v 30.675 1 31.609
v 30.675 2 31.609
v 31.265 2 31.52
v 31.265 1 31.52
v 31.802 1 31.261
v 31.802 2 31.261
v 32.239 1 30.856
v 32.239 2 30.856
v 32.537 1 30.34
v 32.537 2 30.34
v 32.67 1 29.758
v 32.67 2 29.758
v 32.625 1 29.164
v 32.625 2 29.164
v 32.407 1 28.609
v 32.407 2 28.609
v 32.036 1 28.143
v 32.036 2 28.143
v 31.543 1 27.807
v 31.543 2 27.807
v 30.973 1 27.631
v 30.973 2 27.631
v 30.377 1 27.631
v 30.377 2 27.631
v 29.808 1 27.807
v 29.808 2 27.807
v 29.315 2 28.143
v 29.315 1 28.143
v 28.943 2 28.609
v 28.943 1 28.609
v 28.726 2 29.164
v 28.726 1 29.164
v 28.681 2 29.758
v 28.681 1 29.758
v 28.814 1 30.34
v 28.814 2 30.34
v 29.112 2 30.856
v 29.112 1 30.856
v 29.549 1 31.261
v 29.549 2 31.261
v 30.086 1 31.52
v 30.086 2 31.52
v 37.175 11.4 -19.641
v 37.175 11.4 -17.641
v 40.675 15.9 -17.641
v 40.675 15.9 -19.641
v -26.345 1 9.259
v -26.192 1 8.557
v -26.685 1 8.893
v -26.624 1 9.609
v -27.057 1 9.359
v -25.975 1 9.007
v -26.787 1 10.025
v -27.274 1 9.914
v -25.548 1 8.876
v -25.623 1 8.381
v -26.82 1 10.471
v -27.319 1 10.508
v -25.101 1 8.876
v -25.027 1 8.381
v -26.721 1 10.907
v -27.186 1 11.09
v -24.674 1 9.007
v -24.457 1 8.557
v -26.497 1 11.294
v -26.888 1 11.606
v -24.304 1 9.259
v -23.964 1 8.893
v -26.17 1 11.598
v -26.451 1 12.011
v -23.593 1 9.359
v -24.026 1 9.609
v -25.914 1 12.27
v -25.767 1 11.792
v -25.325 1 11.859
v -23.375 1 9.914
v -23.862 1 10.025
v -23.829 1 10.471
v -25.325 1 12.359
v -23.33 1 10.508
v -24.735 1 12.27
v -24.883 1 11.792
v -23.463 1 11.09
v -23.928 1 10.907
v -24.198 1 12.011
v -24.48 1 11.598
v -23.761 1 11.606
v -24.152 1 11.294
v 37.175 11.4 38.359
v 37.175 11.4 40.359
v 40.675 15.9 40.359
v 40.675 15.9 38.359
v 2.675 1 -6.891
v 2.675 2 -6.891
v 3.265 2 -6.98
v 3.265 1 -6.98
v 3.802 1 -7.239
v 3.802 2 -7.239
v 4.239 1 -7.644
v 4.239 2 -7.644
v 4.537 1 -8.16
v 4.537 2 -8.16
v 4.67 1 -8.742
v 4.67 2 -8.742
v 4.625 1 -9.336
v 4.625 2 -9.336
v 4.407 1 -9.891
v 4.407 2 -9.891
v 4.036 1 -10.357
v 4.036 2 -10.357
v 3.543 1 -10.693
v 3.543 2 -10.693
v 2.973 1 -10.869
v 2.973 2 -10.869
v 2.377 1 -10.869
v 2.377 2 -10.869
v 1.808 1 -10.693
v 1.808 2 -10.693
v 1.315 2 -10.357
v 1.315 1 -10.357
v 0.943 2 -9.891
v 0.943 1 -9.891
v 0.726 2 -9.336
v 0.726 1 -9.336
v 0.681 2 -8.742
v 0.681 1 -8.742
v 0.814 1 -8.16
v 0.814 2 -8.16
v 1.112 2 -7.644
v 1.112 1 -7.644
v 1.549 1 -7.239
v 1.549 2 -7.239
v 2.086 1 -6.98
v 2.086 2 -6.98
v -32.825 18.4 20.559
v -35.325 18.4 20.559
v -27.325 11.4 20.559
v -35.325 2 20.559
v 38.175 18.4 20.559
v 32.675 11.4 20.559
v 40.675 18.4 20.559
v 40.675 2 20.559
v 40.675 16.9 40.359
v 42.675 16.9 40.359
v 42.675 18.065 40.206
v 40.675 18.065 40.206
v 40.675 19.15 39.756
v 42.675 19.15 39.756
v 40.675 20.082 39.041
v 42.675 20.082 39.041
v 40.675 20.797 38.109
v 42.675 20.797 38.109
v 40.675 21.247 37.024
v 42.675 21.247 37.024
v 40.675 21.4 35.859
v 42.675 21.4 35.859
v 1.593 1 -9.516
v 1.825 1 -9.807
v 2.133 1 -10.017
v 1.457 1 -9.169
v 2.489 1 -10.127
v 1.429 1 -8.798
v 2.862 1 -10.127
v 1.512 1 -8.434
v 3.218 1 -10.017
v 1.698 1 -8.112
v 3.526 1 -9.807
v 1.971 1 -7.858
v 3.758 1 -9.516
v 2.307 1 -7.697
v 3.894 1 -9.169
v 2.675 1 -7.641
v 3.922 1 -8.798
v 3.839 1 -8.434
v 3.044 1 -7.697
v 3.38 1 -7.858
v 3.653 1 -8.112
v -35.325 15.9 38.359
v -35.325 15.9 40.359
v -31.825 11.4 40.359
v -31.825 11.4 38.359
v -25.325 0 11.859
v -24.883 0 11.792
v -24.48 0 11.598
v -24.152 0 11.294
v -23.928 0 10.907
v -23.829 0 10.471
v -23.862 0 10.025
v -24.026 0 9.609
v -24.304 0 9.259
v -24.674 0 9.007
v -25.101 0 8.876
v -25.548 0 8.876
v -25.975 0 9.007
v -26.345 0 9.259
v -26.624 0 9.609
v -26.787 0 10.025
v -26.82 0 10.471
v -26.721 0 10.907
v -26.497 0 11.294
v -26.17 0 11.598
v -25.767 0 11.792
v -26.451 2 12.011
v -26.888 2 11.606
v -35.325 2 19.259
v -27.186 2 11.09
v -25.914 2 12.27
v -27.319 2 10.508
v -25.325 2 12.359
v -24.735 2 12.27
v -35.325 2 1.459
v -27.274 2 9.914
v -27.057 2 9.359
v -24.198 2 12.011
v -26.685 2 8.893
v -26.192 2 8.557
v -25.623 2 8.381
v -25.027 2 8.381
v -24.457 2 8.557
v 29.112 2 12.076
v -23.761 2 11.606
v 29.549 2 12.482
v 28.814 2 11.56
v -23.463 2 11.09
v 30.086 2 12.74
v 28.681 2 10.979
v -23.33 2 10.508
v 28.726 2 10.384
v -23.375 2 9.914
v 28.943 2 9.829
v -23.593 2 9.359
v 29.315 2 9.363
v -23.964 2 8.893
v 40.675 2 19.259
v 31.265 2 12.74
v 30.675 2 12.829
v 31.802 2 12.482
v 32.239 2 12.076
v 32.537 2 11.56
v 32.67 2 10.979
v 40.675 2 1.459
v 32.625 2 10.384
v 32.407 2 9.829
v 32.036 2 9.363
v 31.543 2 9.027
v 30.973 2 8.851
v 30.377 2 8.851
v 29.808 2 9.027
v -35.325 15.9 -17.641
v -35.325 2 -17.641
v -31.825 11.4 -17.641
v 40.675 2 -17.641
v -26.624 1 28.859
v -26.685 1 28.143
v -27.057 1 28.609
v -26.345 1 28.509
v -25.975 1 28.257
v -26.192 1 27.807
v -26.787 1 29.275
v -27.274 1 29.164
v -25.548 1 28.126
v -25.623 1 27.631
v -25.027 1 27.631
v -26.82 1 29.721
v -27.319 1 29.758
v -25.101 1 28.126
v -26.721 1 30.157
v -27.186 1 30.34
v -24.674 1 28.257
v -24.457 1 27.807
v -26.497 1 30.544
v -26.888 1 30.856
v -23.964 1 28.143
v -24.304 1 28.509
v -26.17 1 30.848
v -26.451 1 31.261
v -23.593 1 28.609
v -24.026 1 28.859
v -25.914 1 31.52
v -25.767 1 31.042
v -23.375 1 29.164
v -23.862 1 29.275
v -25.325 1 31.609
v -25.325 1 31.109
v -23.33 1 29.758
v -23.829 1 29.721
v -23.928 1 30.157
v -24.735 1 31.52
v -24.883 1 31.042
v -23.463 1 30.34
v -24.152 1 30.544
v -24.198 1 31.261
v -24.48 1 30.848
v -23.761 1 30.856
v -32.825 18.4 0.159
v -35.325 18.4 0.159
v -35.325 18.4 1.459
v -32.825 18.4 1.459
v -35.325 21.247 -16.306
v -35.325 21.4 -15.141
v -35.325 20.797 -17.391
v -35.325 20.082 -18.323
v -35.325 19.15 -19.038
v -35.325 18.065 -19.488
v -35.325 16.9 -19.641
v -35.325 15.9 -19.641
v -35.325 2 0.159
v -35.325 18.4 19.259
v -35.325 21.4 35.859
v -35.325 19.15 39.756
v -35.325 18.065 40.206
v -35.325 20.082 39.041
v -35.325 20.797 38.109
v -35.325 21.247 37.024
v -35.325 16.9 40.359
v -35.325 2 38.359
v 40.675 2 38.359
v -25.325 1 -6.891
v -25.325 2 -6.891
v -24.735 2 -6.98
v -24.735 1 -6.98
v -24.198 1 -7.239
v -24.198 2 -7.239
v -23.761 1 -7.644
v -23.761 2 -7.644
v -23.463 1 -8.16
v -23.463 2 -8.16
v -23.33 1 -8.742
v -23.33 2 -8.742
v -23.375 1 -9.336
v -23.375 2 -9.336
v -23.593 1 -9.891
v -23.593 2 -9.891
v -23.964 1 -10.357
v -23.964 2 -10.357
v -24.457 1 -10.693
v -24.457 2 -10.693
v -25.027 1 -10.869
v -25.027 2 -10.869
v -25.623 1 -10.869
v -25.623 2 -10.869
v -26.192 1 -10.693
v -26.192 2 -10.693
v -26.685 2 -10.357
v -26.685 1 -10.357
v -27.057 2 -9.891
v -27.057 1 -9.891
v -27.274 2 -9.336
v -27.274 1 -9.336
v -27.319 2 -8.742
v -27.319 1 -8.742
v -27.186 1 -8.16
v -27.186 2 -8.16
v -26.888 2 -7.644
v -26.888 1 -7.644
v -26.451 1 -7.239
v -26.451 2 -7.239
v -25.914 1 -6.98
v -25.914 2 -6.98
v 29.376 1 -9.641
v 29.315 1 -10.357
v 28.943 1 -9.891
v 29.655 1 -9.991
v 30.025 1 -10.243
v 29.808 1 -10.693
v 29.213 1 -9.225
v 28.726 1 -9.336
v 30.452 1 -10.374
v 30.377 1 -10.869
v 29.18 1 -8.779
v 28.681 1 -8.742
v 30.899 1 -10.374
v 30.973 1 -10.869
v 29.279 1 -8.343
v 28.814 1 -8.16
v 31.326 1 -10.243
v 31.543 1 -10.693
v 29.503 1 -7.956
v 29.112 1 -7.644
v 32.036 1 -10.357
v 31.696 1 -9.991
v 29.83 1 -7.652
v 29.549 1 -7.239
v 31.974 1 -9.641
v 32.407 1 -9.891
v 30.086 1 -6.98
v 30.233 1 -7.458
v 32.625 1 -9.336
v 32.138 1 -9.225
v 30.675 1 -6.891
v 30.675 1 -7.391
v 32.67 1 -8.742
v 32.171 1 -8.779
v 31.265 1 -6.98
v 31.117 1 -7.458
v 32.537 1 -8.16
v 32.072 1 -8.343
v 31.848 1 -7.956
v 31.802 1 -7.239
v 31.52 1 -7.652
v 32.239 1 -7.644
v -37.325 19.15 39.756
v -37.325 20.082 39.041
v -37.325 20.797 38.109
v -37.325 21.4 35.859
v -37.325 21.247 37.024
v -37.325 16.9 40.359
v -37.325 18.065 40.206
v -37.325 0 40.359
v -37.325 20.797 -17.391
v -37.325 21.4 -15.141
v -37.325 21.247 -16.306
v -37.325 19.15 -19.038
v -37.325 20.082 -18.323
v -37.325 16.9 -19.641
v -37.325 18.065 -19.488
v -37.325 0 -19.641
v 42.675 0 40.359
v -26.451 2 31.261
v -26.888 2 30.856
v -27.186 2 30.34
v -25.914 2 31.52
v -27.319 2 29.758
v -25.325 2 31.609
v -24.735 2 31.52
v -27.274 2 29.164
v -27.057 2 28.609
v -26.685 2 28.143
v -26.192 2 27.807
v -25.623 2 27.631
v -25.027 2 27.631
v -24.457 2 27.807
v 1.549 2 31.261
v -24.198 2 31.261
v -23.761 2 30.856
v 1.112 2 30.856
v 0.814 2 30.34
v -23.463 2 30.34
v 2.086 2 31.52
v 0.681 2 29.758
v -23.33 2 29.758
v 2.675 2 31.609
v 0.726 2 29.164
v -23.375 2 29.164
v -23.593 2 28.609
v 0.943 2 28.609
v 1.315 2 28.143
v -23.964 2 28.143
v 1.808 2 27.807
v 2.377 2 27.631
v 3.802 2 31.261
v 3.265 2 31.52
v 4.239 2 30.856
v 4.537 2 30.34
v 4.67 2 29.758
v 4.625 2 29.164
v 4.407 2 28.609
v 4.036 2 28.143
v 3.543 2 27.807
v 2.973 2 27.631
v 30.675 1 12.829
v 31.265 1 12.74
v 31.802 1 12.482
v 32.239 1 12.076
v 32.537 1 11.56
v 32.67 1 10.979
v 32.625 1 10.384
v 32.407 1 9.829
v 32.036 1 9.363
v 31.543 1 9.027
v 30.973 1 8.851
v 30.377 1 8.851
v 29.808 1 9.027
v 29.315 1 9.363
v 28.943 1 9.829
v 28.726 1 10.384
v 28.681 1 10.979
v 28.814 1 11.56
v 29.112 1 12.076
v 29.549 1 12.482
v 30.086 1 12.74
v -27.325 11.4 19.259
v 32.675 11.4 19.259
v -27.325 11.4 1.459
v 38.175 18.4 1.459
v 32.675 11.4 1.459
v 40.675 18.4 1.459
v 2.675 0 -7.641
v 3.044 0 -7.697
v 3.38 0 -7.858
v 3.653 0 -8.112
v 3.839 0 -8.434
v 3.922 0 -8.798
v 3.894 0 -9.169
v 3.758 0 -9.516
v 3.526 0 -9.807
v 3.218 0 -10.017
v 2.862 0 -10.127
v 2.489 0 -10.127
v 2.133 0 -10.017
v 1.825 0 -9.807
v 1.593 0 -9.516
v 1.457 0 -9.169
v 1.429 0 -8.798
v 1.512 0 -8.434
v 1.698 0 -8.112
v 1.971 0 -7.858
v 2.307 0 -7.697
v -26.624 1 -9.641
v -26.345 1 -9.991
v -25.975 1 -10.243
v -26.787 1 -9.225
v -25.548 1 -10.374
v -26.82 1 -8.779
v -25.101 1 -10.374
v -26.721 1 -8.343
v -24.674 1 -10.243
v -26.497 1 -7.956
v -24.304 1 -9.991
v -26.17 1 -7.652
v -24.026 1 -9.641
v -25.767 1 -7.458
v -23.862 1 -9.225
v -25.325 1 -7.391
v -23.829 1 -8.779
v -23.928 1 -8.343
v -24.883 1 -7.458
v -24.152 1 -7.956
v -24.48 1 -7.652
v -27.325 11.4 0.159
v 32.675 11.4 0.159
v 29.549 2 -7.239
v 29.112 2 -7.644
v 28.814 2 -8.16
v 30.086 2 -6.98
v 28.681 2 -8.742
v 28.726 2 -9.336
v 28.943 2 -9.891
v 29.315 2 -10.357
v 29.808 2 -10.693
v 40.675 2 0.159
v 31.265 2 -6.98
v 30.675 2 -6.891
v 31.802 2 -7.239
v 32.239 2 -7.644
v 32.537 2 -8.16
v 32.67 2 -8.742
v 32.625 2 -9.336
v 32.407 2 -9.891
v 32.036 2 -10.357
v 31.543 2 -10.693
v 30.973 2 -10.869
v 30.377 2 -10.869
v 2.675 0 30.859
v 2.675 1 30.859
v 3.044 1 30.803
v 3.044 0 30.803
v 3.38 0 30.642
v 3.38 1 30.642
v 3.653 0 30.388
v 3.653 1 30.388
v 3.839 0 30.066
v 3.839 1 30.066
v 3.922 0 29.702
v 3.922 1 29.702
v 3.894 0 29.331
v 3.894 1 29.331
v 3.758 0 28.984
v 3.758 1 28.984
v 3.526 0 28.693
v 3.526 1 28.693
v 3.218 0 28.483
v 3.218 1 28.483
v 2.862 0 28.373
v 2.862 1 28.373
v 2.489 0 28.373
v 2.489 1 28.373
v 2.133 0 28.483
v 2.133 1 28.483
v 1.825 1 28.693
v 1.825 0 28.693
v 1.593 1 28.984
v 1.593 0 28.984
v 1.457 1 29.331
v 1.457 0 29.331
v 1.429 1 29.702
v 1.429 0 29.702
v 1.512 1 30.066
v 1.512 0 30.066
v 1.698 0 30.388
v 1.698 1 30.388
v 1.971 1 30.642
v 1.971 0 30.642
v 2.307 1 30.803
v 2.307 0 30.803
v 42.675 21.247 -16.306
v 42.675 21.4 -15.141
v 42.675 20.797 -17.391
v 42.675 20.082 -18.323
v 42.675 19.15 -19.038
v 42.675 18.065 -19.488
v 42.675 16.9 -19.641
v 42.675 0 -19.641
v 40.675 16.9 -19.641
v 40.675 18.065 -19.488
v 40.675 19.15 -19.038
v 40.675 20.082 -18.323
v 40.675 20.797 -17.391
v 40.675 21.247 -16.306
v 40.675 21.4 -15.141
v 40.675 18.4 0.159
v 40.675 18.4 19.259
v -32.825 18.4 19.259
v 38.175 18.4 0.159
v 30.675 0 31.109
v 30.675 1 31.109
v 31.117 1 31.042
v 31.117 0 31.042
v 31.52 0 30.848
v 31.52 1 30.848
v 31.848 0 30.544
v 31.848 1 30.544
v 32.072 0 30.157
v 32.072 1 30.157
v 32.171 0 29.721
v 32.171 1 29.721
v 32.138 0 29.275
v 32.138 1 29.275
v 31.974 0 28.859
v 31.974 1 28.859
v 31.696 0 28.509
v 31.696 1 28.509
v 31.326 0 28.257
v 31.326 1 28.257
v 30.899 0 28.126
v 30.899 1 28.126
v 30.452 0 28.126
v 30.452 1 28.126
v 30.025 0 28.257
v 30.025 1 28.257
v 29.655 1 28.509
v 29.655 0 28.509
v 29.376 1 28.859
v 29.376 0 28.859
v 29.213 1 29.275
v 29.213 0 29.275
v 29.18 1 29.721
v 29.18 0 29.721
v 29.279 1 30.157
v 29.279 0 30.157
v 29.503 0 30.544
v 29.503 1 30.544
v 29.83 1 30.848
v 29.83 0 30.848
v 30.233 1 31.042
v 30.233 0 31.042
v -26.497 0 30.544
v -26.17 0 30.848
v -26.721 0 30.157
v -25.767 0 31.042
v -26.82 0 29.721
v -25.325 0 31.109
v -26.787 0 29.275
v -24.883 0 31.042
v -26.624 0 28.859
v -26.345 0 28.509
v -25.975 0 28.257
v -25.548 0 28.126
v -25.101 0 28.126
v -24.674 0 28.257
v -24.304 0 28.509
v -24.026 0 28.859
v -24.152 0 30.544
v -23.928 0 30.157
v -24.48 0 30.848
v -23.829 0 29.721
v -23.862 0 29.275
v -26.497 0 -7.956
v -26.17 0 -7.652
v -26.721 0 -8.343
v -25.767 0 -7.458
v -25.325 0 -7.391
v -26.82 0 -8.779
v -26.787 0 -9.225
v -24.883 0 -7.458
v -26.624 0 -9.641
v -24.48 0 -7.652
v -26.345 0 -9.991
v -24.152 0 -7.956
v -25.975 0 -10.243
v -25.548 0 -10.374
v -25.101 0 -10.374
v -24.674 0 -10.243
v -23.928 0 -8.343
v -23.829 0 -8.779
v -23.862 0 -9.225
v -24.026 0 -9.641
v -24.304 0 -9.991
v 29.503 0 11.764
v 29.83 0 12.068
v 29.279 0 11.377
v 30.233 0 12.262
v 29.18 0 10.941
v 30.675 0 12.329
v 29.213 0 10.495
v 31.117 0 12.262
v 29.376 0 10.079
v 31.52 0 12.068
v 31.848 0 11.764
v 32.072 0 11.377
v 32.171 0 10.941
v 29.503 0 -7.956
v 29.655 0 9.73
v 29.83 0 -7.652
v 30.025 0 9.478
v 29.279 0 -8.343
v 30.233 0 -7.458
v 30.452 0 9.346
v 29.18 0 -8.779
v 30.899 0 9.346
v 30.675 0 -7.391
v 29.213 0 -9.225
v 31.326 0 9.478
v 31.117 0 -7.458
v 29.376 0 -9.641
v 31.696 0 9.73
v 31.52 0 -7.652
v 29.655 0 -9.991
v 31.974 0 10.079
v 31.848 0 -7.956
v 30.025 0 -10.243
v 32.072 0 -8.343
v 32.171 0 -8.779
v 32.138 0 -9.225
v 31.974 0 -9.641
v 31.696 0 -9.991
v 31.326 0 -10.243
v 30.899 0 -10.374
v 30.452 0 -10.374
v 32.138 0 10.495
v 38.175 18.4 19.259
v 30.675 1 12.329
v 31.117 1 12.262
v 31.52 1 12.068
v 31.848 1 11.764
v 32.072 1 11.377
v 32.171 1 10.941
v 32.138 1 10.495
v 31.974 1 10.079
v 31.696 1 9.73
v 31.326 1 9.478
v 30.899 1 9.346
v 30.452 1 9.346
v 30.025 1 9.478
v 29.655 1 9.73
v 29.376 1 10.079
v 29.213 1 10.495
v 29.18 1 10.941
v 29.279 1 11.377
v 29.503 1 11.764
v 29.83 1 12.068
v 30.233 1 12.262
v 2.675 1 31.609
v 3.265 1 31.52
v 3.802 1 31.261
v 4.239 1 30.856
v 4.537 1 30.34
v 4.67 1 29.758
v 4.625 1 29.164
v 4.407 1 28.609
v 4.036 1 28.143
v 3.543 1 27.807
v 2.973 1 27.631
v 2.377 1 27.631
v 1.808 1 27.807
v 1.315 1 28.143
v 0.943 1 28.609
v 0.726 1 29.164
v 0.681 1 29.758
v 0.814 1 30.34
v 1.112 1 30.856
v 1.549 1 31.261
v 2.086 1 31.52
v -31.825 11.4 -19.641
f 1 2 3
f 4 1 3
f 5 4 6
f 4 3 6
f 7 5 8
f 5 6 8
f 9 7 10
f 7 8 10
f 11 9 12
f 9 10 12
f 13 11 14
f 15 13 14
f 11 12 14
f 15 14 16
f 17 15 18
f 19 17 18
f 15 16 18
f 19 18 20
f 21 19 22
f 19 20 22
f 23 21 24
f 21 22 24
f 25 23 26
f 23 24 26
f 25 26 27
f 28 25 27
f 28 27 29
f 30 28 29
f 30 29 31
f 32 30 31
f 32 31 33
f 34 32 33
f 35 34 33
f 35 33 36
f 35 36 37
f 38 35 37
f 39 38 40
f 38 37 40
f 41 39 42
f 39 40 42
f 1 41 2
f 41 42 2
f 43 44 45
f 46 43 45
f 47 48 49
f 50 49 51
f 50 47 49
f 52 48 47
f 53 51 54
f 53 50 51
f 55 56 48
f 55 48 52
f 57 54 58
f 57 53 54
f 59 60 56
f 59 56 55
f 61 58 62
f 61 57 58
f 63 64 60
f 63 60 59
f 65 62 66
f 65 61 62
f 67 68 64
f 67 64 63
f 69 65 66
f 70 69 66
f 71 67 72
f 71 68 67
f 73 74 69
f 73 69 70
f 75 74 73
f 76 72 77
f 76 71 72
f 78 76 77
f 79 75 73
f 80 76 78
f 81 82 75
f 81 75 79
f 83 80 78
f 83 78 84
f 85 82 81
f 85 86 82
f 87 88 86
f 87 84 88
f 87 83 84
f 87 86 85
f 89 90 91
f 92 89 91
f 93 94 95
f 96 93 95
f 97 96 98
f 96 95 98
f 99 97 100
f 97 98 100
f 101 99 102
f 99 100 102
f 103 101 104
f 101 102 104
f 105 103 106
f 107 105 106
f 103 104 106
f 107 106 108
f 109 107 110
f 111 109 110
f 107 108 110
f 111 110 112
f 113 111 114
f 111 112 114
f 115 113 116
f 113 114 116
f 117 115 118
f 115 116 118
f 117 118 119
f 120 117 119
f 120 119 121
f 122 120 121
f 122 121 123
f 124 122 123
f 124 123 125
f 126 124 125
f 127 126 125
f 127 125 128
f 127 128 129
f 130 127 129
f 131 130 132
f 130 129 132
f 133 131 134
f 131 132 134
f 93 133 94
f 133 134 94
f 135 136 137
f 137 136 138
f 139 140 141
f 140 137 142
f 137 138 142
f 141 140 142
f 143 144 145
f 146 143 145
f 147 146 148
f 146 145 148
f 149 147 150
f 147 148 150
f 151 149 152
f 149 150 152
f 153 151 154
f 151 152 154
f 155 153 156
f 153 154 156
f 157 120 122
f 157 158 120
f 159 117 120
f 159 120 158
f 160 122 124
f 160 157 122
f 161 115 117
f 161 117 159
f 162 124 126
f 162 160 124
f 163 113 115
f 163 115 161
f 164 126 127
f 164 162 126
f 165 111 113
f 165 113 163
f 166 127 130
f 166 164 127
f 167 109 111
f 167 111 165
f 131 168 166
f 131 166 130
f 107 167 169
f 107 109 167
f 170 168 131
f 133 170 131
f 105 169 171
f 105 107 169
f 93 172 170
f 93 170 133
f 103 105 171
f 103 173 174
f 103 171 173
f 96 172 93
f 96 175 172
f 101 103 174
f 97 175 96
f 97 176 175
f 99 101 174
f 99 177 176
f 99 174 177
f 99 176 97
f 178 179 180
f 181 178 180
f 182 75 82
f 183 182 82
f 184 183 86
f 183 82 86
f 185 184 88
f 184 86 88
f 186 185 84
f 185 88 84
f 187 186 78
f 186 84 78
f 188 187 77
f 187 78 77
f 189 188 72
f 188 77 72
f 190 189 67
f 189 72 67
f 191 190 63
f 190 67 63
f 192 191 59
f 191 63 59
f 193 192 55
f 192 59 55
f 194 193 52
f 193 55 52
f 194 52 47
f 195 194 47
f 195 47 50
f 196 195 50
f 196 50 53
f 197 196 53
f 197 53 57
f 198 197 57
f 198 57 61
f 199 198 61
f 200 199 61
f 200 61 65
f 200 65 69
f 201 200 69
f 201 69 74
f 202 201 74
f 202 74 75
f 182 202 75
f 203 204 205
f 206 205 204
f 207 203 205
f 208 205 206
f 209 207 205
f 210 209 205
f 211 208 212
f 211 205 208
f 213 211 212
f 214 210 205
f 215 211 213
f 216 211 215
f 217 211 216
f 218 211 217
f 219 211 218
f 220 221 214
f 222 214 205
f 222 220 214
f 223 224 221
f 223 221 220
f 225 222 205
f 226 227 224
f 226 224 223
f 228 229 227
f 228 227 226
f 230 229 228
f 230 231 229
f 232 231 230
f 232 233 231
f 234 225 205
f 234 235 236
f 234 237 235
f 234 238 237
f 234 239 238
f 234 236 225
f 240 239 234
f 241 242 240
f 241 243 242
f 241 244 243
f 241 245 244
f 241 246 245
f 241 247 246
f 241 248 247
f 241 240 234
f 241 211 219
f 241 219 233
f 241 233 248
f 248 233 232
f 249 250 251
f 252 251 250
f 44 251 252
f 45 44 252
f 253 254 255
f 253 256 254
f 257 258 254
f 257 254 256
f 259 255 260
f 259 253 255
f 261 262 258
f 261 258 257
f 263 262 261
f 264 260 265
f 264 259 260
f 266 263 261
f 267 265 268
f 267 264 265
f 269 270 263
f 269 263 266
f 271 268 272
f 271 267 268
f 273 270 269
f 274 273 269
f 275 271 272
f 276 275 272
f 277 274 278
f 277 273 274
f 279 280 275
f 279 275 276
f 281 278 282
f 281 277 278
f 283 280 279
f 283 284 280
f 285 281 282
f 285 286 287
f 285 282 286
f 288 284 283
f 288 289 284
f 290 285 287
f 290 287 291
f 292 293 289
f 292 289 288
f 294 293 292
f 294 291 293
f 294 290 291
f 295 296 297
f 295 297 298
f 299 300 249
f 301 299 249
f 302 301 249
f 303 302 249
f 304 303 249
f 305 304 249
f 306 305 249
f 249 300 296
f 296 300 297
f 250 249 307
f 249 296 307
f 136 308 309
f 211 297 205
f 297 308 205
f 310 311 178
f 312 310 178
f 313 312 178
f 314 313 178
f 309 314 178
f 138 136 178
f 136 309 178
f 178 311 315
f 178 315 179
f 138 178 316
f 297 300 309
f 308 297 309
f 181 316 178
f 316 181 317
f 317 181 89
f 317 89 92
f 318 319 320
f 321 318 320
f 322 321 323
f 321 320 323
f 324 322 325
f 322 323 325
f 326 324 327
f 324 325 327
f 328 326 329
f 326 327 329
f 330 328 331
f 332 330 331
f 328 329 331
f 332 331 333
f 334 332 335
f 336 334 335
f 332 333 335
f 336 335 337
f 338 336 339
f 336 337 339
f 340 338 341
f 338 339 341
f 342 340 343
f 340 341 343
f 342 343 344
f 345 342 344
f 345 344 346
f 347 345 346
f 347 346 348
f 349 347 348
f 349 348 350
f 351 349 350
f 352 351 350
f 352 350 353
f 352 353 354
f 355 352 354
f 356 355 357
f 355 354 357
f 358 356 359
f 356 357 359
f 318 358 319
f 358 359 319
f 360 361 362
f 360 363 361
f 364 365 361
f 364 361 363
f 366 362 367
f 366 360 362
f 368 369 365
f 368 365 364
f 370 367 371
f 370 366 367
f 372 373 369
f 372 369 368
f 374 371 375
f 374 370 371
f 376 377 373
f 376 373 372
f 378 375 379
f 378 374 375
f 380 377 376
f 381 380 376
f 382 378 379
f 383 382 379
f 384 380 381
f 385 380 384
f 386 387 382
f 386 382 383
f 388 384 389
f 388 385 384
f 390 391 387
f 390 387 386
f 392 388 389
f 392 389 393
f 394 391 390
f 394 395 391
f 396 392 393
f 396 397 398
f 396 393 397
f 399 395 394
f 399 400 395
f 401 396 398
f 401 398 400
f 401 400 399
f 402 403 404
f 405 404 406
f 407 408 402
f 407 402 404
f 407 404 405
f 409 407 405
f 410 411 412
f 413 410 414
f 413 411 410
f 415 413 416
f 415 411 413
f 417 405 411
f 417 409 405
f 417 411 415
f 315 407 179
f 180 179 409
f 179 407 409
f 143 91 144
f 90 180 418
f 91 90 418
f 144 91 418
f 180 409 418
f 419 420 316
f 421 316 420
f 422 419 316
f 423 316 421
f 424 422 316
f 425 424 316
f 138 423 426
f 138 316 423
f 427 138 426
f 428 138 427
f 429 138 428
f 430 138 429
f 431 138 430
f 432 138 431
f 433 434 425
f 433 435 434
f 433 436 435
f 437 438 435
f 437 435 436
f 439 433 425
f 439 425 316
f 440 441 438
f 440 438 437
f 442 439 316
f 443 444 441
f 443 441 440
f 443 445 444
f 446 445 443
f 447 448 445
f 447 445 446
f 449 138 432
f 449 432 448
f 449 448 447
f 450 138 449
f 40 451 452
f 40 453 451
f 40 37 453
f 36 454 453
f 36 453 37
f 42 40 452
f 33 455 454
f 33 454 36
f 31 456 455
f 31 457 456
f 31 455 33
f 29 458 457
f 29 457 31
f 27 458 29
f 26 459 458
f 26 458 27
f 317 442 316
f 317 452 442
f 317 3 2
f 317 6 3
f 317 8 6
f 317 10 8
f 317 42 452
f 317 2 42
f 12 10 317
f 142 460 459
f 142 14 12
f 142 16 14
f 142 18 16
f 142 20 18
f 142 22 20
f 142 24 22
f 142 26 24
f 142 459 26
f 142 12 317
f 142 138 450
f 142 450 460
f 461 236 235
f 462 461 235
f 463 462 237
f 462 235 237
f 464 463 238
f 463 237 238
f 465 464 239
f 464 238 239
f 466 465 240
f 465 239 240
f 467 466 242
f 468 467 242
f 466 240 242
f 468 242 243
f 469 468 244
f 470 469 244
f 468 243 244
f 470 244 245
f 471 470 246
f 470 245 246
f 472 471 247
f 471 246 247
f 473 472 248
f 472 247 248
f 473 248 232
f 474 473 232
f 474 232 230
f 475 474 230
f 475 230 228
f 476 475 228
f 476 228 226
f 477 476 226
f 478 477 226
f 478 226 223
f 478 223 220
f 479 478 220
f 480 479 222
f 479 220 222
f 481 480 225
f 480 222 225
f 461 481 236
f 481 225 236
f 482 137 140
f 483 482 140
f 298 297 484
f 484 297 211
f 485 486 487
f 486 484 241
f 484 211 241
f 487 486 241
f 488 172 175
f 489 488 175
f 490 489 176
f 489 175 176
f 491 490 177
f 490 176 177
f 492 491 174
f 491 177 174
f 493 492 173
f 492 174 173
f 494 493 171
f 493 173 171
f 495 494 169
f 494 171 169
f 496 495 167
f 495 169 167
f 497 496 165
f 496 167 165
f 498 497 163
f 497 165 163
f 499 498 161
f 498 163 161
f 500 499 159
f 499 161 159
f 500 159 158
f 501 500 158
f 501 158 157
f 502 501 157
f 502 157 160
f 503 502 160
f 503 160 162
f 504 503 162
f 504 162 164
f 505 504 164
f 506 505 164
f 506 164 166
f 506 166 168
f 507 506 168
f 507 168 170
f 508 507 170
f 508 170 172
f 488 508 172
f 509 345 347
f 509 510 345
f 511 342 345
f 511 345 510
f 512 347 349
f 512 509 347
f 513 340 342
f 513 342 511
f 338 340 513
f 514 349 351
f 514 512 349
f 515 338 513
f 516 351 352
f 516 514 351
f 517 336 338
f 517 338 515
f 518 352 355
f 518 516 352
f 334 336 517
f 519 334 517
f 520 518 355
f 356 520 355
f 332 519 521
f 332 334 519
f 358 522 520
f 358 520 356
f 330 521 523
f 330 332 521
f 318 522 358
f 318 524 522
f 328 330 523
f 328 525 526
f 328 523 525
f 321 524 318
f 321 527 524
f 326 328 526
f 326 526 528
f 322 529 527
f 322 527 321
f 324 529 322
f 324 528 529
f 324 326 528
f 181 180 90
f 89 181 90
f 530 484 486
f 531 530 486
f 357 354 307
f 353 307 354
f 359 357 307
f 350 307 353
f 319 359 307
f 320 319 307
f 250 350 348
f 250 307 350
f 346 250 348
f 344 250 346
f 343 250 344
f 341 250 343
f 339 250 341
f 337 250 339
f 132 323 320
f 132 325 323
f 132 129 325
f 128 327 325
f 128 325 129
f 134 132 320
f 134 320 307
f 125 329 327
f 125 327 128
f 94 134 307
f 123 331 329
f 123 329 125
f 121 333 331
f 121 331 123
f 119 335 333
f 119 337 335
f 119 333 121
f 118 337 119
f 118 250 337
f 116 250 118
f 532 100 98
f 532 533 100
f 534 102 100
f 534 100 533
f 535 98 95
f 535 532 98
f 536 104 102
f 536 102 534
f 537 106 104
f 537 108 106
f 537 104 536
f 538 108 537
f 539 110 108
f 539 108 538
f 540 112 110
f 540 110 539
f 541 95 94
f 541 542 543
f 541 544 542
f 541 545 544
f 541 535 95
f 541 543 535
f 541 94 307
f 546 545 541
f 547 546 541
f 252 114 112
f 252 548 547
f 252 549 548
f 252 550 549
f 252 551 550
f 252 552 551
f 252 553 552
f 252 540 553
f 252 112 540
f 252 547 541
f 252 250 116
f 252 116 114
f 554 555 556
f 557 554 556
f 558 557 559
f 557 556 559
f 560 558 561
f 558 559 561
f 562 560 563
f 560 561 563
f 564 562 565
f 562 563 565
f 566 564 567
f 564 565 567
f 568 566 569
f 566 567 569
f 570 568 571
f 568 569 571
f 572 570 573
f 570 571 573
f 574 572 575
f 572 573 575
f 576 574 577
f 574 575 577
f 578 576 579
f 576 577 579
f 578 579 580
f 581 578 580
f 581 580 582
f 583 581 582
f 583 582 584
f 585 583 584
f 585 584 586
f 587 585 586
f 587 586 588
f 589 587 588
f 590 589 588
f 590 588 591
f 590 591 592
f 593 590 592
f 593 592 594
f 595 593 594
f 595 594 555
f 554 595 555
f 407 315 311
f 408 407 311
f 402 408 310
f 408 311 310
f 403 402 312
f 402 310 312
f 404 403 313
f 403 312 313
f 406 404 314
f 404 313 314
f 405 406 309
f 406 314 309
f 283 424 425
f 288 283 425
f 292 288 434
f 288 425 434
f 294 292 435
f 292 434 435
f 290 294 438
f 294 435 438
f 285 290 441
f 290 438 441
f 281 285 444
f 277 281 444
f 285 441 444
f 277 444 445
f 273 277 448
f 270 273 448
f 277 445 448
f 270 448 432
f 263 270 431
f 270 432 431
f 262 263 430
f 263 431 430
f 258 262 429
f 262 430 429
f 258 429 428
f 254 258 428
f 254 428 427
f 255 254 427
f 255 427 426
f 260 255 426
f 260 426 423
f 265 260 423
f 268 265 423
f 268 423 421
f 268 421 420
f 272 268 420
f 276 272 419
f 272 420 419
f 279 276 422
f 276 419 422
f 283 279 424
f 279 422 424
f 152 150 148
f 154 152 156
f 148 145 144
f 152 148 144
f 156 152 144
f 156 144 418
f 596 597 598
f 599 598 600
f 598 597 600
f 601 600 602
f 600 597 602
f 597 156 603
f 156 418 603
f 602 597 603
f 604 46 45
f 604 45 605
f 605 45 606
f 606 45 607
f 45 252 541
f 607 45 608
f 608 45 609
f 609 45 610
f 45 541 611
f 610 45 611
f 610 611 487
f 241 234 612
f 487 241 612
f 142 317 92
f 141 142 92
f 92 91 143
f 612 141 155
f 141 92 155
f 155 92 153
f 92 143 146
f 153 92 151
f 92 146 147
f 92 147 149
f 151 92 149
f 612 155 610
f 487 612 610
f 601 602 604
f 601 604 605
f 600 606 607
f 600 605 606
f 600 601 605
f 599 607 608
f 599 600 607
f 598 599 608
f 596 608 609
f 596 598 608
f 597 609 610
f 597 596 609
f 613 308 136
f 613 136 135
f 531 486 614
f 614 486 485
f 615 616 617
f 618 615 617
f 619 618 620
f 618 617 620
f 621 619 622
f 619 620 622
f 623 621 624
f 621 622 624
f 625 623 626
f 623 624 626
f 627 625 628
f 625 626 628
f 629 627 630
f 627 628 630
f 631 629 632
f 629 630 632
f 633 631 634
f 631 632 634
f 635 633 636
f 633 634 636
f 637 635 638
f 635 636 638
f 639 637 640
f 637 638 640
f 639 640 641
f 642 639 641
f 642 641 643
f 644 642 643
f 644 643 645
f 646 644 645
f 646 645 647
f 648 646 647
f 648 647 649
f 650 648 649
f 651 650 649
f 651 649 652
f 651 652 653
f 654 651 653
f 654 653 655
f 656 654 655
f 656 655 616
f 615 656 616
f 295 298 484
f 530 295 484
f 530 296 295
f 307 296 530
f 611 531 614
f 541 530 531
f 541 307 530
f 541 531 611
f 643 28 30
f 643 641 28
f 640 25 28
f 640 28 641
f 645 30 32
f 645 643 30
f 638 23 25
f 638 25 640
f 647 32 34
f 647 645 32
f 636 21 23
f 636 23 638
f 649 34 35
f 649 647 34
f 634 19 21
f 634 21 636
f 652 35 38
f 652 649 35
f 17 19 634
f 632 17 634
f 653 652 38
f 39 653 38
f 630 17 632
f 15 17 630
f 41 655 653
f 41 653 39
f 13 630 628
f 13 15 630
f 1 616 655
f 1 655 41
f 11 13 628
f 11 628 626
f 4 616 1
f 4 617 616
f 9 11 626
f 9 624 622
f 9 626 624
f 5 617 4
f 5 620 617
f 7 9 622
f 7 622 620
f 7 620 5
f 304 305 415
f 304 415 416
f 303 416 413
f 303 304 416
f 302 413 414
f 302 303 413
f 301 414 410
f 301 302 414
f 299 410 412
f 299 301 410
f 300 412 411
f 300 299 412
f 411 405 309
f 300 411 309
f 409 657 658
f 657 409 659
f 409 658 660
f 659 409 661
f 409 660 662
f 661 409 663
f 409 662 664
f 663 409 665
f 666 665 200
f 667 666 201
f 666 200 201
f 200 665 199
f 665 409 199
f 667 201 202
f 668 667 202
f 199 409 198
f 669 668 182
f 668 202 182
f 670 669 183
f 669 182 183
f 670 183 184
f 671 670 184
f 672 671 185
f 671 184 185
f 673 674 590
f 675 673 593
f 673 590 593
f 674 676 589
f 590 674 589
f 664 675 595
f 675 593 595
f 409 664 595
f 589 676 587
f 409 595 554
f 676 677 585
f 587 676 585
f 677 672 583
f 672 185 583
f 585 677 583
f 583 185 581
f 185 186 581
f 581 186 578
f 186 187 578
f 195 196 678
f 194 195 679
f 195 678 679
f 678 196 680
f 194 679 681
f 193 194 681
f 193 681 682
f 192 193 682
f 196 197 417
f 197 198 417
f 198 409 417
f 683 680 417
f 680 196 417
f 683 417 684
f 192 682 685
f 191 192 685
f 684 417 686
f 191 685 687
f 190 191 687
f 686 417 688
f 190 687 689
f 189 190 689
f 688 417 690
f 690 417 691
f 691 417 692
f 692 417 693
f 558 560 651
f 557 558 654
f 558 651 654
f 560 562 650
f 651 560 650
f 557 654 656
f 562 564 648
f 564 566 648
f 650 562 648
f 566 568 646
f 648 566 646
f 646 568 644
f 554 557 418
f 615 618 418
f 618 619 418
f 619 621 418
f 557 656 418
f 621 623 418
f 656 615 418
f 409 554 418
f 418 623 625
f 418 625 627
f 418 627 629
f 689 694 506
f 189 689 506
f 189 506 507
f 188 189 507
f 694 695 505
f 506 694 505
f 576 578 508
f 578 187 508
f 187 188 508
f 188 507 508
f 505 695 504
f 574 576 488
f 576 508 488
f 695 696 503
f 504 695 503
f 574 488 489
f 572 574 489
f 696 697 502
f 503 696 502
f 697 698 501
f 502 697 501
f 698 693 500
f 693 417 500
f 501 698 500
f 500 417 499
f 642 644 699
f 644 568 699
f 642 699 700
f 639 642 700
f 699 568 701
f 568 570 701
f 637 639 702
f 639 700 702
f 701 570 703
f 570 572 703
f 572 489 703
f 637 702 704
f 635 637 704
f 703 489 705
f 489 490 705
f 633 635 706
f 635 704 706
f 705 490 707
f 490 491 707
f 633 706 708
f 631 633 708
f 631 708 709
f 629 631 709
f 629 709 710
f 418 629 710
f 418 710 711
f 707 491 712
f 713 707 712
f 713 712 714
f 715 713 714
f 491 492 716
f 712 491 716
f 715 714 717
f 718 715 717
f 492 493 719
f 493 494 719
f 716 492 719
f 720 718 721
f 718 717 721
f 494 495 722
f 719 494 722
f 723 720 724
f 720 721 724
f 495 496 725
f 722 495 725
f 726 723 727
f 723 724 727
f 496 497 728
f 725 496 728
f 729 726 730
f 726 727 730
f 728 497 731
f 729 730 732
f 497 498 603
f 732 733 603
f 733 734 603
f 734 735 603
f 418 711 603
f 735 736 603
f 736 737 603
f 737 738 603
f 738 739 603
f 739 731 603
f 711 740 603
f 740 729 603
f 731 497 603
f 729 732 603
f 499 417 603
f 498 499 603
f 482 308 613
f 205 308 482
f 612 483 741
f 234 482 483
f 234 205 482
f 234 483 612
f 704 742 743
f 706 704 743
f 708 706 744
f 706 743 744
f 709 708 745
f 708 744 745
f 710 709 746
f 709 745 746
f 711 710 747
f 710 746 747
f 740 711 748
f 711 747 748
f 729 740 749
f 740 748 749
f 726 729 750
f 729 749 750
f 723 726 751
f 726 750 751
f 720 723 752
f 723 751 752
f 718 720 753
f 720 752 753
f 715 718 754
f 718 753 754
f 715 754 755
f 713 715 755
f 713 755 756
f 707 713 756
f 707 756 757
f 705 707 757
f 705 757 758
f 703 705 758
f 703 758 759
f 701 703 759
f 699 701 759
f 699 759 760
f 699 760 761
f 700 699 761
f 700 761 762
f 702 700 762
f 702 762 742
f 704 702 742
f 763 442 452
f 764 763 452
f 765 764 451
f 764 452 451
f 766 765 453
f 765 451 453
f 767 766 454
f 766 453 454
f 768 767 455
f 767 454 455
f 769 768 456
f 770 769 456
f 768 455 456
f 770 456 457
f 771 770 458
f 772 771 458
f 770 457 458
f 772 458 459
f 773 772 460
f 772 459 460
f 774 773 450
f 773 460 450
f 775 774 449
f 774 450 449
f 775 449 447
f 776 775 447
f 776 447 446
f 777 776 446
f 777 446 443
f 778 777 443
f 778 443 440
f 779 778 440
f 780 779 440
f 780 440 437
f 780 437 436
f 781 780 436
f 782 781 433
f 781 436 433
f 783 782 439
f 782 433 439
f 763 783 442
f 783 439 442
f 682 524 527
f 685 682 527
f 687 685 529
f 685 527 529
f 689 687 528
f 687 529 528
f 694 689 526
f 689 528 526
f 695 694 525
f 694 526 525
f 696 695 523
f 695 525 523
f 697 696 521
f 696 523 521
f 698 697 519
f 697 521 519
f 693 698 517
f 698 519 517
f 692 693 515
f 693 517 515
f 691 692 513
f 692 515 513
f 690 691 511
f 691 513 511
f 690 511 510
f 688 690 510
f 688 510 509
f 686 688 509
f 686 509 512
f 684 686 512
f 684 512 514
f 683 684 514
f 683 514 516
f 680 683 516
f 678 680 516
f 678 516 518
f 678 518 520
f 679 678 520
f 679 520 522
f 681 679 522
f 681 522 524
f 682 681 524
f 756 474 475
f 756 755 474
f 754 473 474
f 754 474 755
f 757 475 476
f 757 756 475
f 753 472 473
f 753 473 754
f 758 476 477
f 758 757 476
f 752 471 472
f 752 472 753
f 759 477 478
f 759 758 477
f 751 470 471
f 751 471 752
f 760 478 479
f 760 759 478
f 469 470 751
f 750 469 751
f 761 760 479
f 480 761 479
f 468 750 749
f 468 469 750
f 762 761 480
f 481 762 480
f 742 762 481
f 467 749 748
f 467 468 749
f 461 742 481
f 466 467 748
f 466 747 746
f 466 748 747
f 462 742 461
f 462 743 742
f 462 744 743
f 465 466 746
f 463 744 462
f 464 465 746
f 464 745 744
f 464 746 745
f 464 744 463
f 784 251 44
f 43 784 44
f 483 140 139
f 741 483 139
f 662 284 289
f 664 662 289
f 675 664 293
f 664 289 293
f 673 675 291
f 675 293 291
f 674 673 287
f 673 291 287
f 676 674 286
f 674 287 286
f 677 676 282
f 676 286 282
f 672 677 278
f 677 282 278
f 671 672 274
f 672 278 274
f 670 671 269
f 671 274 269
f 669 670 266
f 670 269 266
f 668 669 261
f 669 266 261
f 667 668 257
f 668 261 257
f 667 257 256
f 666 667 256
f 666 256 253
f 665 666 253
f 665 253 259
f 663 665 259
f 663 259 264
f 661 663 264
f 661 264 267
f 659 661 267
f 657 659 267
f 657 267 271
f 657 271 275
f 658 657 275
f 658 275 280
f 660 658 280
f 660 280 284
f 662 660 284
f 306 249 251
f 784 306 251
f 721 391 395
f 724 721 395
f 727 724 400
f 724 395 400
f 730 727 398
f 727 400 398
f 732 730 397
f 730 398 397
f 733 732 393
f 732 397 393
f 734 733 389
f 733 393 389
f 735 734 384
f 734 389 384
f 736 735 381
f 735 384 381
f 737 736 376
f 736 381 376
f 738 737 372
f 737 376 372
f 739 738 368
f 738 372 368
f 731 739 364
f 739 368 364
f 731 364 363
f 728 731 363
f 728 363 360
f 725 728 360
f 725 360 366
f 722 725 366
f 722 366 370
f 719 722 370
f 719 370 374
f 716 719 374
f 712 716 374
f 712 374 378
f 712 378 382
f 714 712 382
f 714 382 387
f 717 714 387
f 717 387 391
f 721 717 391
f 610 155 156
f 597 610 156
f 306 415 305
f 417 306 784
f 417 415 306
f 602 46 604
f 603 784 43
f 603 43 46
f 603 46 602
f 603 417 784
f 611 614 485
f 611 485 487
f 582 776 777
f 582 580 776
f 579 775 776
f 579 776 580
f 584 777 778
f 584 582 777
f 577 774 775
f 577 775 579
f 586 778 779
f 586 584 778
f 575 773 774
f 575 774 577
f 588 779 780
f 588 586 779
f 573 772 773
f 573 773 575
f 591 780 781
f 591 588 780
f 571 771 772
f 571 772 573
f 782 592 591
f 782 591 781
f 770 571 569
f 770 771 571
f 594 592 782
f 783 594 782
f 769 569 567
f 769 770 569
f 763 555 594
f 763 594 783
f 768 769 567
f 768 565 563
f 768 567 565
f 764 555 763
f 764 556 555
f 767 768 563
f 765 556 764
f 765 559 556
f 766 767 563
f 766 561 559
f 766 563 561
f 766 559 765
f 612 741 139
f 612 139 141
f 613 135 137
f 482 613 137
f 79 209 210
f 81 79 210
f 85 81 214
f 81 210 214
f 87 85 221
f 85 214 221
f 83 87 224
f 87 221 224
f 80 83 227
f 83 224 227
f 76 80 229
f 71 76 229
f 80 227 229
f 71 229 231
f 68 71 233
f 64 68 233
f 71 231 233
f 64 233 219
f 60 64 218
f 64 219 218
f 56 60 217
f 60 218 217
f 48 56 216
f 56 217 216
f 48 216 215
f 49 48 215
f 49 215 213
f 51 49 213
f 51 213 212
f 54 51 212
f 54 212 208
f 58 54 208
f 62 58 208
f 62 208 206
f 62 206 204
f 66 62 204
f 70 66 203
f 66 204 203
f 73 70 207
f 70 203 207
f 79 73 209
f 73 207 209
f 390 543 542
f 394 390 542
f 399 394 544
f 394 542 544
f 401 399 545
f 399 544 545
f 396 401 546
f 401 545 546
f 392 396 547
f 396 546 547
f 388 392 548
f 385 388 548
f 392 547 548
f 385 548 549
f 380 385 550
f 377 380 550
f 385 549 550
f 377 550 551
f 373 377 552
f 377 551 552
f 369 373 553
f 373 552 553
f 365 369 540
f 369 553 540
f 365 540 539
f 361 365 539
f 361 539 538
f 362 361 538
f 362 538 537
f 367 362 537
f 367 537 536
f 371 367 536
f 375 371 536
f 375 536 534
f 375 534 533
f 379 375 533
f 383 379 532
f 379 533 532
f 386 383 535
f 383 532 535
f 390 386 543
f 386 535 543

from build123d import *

# Parameters (mm, degrees)
SKETCH_1_W          = 80
SKETCH_1_H          = 60
EXTRUDE_1_DEPTH     = 21.4
FILLET_1_R          = 4.5
CUT_EXTRUDE_1_DEPTH = 77.675595548
SKETCH_3_W          = 76
SKETCH_3_H          = 56
CUT_EXTRUDE_2_DEPTH = 19.4
SKETCH_4_W          = 76
SKETCH_4_H          = 1.3
EXTRUDE_2_DEPTH     = 16.4
CUT_EXTRUDE_3_DEPTH = 26.4
CUT_EXTRUDE_4_REACH = 63.858
SKETCH_6_R          = 1.25
SKETCH_6_R_2        = 1.5
SKETCH_7_R          = 2
CUT_EXTRUDE_5_DEPTH = 1


with BuildPart() as part:
    # 草图1 → 凸台-拉伸1 (new body)
    with BuildSketch(Plane(origin=(0, 0, 0), x_dir=(1, 0, 0), z_dir=(0, 1, 0))):
        with Locations((2.675367047, -10.358890701)):
            Rectangle(SKETCH_1_W, SKETCH_1_H)
    extrude(amount=EXTRUDE_1_DEPTH)

    # 圆角1
    fillet_1_edges = [part.edges().sort_by_distance(p)[0] for p in [
        (2.675367047, 21.4, -19.641109299),
        (2.675367047, 21.4, 40.358890701),
    ]]
    fillet(fillet_1_edges, radius=FILLET_1_R)

    # 草图2 → 切除-拉伸1 (cut, through all)
    with BuildSketch(Plane.XY.offset(40.358890701)):
        Polygon((40.675367047, 21.4), (-35.324632953, 21.4), (-35.324632953, 15.9), (-31.824632953, 11.4), (37.175367047, 11.4), (40.675367047, 15.9), align=None)
    extrude(amount=-CUT_EXTRUDE_1_DEPTH, mode=Mode.SUBTRACT)

    # 草图3 → 切除-拉伸2 (cut)
    with BuildSketch(Plane(origin=(0, 21.4, 0), x_dir=(1, 0, 0), z_dir=(0, 1, 0))):
        with Locations((2.675367047, -10.358890701)):
            Rectangle(SKETCH_3_W, SKETCH_3_H)
    extrude(amount=-CUT_EXTRUDE_2_DEPTH, mode=Mode.SUBTRACT)

    # 草图4 → 凸台-拉伸2 (add)
    with BuildSketch(Plane(origin=(0, 2, 0), x_dir=(1, 0, 0), z_dir=(0, 1, 0))):
        with Locations((2.675367047, -0.808890701)):
            Rectangle(SKETCH_4_W, SKETCH_4_H)
        with Locations((2.675367047, -19.908890701)):
            Rectangle(SKETCH_4_W, SKETCH_4_H)
    extrude(amount=EXTRUDE_2_DEPTH)

    # 草图5 → 切除-拉伸3 (cut)
    with BuildSketch(Plane.XY.offset(20.558890701)):
        Polygon((-32.824984691, 18.4), (-27.324632953, 11.4), (32.675367047, 11.4), (38.175367047, 18.4), align=None)
    extrude(amount=-CUT_EXTRUDE_3_DEPTH, mode=Mode.SUBTRACT)

    # 草图6 → 切除-拉伸4 (cut, up to next)
    with BuildSketch(Plane(origin=(0, 2, 0), x_dir=(1, 0, 0), z_dir=(0, 1, 0)), mode=Mode.PRIVATE) as cut_extrude_4_sk1:
        with Locations(Location((2.675367047, 8.891109299, 0), (0, 0, 270))):
            Circle(SKETCH_6_R)
    cut_extrude_4_tool1 = extrude(cut_extrude_4_sk1.sketch, amount=-CUT_EXTRUDE_4_REACH, mode=Mode.PRIVATE) & part.part
    # 草图6 → 切除-拉伸4 (cut, up to next)
    with BuildSketch(Plane(origin=(0, 2, 0), x_dir=(1, 0, 0), z_dir=(0, 1, 0)), mode=Mode.PRIVATE) as cut_extrude_4_sk2:
        with Locations(Location((2.675367047, -29.608890701, 0), (0, 0, 270))):
            Circle(SKETCH_6_R)
    cut_extrude_4_tool2 = extrude(cut_extrude_4_sk2.sketch, amount=-CUT_EXTRUDE_4_REACH, mode=Mode.PRIVATE) & part.part
    # 草图6 → 切除-拉伸4 (cut, up to next)
    with BuildSketch(Plane(origin=(0, 2, 0), x_dir=(1, 0, 0), z_dir=(0, 1, 0)), mode=Mode.PRIVATE) as cut_extrude_4_sk3:
        with Locations(Location((-25.324632953, 8.891109299, 0), (0, 0, 270))):
            Circle(SKETCH_6_R_2)
    cut_extrude_4_tool3 = extrude(cut_extrude_4_sk3.sketch, amount=-CUT_EXTRUDE_4_REACH, mode=Mode.PRIVATE) & part.part
    # 草图6 → 切除-拉伸4 (cut, up to next)
    with BuildSketch(Plane(origin=(0, 2, 0), x_dir=(1, 0, 0), z_dir=(0, 1, 0)), mode=Mode.PRIVATE) as cut_extrude_4_sk4:
        with Locations(Location((30.675367047, 8.891109299, 0), (0, 0, 270))):
            Circle(SKETCH_6_R_2)
    cut_extrude_4_tool4 = extrude(cut_extrude_4_sk4.sketch, amount=-CUT_EXTRUDE_4_REACH, mode=Mode.PRIVATE) & part.part
    # 草图6 → 切除-拉伸4 (cut, up to next)
    with BuildSketch(Plane(origin=(0, 2, 0), x_dir=(1, 0, 0), z_dir=(0, 1, 0)), mode=Mode.PRIVATE) as cut_extrude_4_sk5:
        with Locations(Location((30.675367047, -10.829122265, 0), (0, 0, 270))):
            Circle(SKETCH_6_R_2)
    cut_extrude_4_tool5 = extrude(cut_extrude_4_sk5.sketch, amount=-CUT_EXTRUDE_4_REACH, mode=Mode.PRIVATE) & part.part
    # 草图6 → 切除-拉伸4 (cut, up to next)
    with BuildSketch(Plane(origin=(0, 2, 0), x_dir=(1, 0, 0), z_dir=(0, 1, 0)), mode=Mode.PRIVATE) as cut_extrude_4_sk6:
        with Locations(Location((30.675367047, -29.608890701, 0), (0, 0, 270))):
            Circle(SKETCH_6_R_2)
    cut_extrude_4_tool6 = extrude(cut_extrude_4_sk6.sketch, amount=-CUT_EXTRUDE_4_REACH, mode=Mode.PRIVATE) & part.part
    # 草图6 → 切除-拉伸4 (cut, up to next)
    with BuildSketch(Plane(origin=(0, 2, 0), x_dir=(1, 0, 0), z_dir=(0, 1, 0)), mode=Mode.PRIVATE) as cut_extrude_4_sk7:
        with Locations(Location((-25.324632953, -29.608890701, 0), (0, 0, 270))):
            Circle(SKETCH_6_R_2)
    cut_extrude_4_tool7 = extrude(cut_extrude_4_sk7.sketch, amount=-CUT_EXTRUDE_4_REACH, mode=Mode.PRIVATE) & part.part
    # 草图6 → 切除-拉伸4 (cut, up to next)
    with BuildSketch(Plane(origin=(0, 2, 0), x_dir=(1, 0, 0), z_dir=(0, 1, 0)), mode=Mode.PRIVATE) as cut_extrude_4_sk8:
        with Locations(Location((-25.324632953, -10.358890701, 0), (0, 0, 270))):
            Circle(SKETCH_6_R_2)
    cut_extrude_4_tool8 = extrude(cut_extrude_4_sk8.sketch, amount=-CUT_EXTRUDE_4_REACH, mode=Mode.PRIVATE) & part.part
    add(cut_extrude_4_tool1.solids().sort_by_distance((2.675367, 2, -8.891109))[0], mode=Mode.SUBTRACT)
    add(cut_extrude_4_tool2.solids().sort_by_distance((2.675367, 2, 29.608891))[0], mode=Mode.SUBTRACT)
    add(cut_extrude_4_tool3.solids().sort_by_distance((-25.324633, 2, -8.891109))[0], mode=Mode.SUBTRACT)
    add(cut_extrude_4_tool4.solids().sort_by_distance((30.675367, 2, -8.891109))[0], mode=Mode.SUBTRACT)
    add(cut_extrude_4_tool5.solids().sort_by_distance((30.675367, 2, 10.829122))[0], mode=Mode.SUBTRACT)
    add(cut_extrude_4_tool6.solids().sort_by_distance((30.675367, 2, 29.608891))[0], mode=Mode.SUBTRACT)
    add(cut_extrude_4_tool7.solids().sort_by_distance((-25.324633, 2, 29.608891))[0], mode=Mode.SUBTRACT)
    add(cut_extrude_4_tool8.solids().sort_by_distance((-25.324633, 2, 10.358891))[0], mode=Mode.SUBTRACT)

    # 草图7 → 切除-拉伸5 (cut)
    with BuildSketch(Plane(origin=(0, 2, 0), x_dir=(1, 0, 0), z_dir=(0, 1, 0))):
        with Locations(Location((-25.324632953, 8.891109299, 0), (0, 0, 270))):
            Circle(SKETCH_7_R)
        with Locations(Location((2.675367047, 8.891109299, 0), (0, 0, 270))):
            Circle(SKETCH_7_R)
        with Locations(Location((30.675367047, 8.891109299, 0), (0, 0, 270))):
            Circle(SKETCH_7_R)
        with Locations(Location((-25.324632953, -10.358890701, 0), (0, 0, 270))):
            Circle(SKETCH_7_R)
        with Locations(Location((30.675367047, -10.829122265, 0), (0, 0, 270))):
            Circle(SKETCH_7_R)
        with Locations(Location((-25.324632953, -29.608890701, 0), (0, 0, 270))):
            Circle(SKETCH_7_R)
        with Locations(Location((2.675367047, -29.608890701, 0), (0, 0, 270))):
            Circle(SKETCH_7_R)
        with Locations(Location((30.675367047, -29.608890701, 0), (0, 0, 270))):
            Circle(SKETCH_7_R)
    extrude(amount=-CUT_EXTRUDE_5_DEPTH, mode=Mode.SUBTRACT)


solid = part.part
